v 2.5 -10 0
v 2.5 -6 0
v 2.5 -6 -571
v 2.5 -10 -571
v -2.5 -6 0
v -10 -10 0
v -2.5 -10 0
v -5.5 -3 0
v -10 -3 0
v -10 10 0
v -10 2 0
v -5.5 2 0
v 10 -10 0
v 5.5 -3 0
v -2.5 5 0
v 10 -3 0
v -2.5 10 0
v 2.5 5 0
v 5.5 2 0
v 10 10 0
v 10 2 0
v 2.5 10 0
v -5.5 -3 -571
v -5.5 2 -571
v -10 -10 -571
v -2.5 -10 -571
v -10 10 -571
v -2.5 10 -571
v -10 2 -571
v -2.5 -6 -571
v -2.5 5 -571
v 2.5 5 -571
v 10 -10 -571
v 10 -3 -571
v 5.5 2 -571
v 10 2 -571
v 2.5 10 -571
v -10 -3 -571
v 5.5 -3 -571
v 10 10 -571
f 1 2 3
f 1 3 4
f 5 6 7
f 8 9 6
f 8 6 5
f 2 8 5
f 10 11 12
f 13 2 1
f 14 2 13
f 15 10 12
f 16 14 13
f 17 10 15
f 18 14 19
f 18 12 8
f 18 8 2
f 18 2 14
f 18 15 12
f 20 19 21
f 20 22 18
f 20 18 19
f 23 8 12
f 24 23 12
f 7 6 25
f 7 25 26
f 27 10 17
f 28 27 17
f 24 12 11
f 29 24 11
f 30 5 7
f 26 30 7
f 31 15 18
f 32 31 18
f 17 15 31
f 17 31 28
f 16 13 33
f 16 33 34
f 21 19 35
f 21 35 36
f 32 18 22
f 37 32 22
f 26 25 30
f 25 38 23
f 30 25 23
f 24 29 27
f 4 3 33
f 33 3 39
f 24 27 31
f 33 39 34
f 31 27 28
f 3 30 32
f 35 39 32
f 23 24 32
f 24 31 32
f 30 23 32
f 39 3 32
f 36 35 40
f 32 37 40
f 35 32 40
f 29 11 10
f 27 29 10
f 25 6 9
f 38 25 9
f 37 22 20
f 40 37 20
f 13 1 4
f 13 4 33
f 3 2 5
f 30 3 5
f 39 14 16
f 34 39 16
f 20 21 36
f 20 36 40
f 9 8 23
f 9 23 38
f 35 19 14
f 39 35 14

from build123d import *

# Parameters (mm, degrees)
SKETCH1_W           = 20
SKETCH1_H           = 20
BOSS_EXTRUDE1_DEPTH = 571
SKETCH2_W           = 5
SKETCH2_H           = 10
CUT_EXTRUDE1_DEPTH  = 572
CIRPATTERN1_COUNT   = 4


with BuildPart() as part:
    # Sketch1 → Boss-Extrude1 (new body)
    with BuildSketch(Plane.XY):
        Rectangle(SKETCH1_W, SKETCH1_H)
    extrude(amount=-BOSS_EXTRUDE1_DEPTH)

    # Sketch2 → Cut-Extrude1 (cut, through all)
    with BuildSketch(Plane.XY):
        with Locations((0, 10)):
            Rectangle(SKETCH2_W, SKETCH2_H)
    cut_extrude1 = extrude(amount=-CUT_EXTRUDE1_DEPTH, mode=Mode.SUBTRACT)

    # CirPattern1: Cut-Extrude1 ×4 about axis
    cirpattern1_axis = Axis((0, -0.5, 0), (0, 0, 1))
    for i in range(1, CIRPATTERN1_COUNT):
        add(cut_extrude1.rotate(cirpattern1_axis, i * 360 / CIRPATTERN1_COUNT), mode=Mode.SUBTRACT)


solid = part.part
